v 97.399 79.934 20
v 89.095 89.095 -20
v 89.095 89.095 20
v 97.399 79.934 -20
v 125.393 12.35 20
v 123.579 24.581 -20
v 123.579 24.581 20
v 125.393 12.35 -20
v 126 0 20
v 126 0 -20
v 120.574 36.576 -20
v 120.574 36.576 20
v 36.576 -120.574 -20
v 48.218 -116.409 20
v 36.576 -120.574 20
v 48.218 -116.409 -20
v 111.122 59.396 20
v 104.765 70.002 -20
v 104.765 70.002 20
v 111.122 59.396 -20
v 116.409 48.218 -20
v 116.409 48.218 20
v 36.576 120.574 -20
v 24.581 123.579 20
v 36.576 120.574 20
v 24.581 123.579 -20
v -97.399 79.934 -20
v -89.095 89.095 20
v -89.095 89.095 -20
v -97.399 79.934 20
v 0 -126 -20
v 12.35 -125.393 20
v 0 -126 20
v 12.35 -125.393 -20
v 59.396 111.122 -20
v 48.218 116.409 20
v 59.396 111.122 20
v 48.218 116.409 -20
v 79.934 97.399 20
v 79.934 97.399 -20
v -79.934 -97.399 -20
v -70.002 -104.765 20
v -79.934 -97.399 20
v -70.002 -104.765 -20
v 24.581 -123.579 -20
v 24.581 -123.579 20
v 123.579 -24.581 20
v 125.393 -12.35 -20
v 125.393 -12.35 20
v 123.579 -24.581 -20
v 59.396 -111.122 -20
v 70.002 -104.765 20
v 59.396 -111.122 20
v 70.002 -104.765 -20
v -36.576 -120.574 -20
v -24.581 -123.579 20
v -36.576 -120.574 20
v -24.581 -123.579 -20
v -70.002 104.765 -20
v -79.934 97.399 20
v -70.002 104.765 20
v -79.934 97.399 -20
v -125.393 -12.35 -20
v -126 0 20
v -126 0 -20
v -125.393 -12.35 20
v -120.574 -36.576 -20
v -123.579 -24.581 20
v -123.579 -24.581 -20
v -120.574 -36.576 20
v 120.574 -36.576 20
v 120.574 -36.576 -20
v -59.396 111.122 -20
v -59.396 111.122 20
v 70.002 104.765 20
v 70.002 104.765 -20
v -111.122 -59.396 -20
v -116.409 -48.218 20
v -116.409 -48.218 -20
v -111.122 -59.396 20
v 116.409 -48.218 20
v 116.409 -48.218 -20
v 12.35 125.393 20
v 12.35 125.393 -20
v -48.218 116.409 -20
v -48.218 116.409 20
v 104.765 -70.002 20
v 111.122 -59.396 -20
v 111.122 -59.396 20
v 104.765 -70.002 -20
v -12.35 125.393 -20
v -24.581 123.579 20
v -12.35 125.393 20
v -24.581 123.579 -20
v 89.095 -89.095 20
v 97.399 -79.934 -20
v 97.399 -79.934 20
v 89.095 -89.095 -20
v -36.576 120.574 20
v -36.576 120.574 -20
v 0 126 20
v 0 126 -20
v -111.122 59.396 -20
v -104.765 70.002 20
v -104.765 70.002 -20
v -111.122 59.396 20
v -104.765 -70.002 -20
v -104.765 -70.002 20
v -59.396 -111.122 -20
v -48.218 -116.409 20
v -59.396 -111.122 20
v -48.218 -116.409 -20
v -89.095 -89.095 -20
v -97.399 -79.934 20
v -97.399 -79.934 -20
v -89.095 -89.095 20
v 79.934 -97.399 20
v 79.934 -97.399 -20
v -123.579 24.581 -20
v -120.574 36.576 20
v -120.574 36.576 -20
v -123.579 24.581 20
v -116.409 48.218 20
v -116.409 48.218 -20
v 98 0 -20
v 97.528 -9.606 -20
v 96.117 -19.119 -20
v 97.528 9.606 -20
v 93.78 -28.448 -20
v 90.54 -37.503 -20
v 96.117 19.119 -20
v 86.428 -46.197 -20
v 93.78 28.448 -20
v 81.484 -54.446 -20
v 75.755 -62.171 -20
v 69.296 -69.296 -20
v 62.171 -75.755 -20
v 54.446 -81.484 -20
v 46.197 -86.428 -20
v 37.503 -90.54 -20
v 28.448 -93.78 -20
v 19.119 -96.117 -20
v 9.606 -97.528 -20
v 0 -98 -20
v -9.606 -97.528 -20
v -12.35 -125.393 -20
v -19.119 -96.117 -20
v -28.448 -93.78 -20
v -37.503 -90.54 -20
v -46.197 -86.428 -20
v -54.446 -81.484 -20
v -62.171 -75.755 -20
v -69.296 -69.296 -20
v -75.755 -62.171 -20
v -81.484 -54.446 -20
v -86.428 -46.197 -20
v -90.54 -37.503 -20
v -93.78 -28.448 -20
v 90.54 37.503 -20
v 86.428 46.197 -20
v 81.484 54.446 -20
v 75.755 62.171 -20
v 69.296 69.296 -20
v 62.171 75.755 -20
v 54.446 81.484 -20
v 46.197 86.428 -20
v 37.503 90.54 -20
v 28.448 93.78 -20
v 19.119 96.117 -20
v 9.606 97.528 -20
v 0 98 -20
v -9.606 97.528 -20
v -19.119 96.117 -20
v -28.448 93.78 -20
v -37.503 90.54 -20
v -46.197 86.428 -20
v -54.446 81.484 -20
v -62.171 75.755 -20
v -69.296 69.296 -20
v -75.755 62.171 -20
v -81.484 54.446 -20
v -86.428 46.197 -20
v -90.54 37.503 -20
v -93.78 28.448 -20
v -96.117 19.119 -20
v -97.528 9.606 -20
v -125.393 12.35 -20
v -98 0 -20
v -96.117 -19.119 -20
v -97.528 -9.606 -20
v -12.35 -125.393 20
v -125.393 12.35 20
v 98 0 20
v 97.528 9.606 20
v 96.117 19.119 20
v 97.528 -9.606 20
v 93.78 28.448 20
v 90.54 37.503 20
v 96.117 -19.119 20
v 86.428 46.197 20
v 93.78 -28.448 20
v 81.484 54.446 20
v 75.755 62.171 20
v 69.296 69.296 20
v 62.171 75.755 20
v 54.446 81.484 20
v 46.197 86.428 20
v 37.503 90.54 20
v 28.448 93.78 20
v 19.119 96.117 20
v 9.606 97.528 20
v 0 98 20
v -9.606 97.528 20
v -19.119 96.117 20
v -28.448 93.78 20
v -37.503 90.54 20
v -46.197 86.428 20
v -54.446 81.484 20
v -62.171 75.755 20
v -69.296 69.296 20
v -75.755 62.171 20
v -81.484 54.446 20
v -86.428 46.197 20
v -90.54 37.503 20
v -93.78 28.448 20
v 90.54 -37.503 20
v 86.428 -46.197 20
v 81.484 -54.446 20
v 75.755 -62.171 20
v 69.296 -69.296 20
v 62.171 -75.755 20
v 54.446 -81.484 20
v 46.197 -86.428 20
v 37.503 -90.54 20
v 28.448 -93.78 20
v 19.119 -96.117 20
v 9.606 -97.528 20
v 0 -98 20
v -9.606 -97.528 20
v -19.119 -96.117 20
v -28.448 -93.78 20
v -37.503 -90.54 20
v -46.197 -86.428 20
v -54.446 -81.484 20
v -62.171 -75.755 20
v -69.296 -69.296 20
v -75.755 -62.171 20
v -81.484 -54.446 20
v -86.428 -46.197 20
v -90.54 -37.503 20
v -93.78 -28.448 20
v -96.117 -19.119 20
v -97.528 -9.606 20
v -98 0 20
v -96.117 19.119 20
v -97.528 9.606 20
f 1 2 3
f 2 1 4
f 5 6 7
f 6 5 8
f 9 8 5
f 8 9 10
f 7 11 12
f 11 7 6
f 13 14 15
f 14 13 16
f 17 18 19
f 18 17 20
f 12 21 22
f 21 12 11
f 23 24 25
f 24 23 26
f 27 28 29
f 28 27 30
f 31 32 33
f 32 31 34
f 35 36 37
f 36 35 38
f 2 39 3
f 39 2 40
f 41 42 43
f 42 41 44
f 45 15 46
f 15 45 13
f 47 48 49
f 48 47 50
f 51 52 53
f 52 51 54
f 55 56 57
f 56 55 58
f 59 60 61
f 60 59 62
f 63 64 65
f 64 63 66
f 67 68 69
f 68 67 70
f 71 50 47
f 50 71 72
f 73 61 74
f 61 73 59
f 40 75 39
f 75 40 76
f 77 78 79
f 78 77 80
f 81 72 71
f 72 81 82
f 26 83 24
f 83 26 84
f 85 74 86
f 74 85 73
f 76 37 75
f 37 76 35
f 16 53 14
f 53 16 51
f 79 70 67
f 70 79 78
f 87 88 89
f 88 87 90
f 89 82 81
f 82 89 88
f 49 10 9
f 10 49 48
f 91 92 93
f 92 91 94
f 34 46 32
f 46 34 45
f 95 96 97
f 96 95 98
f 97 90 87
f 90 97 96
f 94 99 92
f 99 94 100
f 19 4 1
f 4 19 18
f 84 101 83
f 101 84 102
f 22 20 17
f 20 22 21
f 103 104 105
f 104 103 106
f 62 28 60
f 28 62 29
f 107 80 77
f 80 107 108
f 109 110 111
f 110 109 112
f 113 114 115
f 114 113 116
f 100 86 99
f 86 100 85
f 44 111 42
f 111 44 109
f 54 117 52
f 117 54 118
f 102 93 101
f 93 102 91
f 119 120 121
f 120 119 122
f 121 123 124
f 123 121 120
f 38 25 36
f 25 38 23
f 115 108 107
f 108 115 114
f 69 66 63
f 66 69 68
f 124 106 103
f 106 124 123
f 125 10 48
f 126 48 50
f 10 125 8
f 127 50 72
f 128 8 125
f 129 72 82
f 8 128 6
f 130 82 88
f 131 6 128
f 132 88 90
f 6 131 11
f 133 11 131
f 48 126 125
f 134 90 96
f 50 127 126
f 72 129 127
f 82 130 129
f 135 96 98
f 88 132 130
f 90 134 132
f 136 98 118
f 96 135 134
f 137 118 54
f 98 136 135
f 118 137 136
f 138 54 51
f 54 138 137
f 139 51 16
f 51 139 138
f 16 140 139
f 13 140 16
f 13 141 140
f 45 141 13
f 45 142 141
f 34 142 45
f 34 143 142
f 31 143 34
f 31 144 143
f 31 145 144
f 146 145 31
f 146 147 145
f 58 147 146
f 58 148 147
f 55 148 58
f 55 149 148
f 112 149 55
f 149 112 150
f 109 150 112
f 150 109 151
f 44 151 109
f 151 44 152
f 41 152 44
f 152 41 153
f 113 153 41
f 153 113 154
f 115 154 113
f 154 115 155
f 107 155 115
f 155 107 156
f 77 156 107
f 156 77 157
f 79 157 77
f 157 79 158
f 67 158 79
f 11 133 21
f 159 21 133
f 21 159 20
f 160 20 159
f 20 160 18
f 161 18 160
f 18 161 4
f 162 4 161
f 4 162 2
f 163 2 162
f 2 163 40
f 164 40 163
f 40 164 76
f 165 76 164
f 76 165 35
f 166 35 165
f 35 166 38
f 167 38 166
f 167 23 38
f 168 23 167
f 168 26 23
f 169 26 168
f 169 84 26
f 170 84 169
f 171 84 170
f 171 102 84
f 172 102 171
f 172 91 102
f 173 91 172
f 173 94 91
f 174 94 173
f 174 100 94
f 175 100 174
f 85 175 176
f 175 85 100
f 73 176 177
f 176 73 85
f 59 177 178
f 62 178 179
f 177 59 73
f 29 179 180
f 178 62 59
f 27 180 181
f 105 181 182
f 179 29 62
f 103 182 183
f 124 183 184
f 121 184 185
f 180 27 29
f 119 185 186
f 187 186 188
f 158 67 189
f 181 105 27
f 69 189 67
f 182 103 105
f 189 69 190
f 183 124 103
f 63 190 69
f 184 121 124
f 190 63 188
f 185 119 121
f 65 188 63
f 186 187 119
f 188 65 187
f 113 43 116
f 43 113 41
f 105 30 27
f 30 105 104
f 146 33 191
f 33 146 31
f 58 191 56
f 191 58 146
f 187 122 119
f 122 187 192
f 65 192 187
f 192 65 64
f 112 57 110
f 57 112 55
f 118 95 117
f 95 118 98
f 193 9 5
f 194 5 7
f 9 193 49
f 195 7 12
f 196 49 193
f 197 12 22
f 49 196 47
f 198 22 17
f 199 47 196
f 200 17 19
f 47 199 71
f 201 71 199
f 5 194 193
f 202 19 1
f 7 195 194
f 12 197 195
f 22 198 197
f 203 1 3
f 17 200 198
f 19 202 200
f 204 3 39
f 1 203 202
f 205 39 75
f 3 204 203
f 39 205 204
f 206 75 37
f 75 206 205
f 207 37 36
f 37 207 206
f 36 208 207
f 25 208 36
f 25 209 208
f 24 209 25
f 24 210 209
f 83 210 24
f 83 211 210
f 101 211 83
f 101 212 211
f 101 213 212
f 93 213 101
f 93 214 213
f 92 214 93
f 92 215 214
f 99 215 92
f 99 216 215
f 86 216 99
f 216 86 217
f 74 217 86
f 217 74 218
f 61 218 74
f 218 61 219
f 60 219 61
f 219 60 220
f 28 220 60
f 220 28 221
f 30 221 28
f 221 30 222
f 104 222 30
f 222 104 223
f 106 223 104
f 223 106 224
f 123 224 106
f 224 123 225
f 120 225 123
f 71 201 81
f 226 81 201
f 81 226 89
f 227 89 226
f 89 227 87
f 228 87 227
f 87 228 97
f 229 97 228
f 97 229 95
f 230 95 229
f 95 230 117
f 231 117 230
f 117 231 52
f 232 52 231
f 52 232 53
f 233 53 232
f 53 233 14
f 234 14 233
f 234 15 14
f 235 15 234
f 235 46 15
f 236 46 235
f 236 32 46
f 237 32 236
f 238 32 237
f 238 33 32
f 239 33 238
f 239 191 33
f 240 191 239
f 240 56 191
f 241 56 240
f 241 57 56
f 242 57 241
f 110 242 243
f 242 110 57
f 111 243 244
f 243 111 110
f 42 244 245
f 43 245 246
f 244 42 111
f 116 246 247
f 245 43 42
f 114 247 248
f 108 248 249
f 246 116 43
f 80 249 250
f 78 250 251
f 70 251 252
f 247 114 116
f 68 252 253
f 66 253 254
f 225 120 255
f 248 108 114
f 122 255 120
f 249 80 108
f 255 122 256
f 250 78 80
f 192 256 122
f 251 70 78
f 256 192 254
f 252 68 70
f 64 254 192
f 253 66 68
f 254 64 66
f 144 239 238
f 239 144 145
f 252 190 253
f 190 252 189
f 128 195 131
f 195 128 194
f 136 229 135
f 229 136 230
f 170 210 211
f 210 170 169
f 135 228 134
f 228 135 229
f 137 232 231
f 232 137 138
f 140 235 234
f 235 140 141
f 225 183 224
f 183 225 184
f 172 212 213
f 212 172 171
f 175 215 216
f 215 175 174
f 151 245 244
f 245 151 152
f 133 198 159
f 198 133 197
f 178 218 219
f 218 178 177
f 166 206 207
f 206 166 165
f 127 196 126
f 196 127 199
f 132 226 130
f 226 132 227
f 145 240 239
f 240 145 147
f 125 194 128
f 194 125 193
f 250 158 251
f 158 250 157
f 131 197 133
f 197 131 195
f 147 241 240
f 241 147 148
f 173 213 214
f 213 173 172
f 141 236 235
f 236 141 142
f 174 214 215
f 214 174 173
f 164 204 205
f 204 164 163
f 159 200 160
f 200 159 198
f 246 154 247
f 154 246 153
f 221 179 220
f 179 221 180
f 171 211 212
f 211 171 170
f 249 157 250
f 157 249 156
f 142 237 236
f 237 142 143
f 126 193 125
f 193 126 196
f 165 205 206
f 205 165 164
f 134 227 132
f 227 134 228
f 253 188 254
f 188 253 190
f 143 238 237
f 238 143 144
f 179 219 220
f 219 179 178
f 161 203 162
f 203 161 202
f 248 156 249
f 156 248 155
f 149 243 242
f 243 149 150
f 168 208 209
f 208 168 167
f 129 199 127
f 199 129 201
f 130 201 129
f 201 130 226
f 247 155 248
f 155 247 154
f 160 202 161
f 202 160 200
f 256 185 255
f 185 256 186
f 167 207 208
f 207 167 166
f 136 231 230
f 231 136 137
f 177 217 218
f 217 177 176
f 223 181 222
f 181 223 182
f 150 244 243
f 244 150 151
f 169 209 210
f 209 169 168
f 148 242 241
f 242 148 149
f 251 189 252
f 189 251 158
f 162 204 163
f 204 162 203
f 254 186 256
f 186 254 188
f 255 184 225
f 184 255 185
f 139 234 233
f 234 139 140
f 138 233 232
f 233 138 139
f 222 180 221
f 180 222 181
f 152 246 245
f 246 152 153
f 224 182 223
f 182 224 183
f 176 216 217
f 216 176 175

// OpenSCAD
// ============================================================================
// Atom Lithography Machine — Parametric OpenSCAD Module (S6.11-03)
// ============================================================================
// part_id           : S6.11-03
// parent_bom_id     : S6.11
// subsystem         : S6
// part_name         : 4 K Ultra-Dusuk-Gurultulu HEMT Bankasi (LNF-LNC4_8C sinifi, 32 adet, 7.8 mW/hat, Exp140 S6.5-03, 1.02 kg)
// material          : OFHC Cu
// temp_stage        : 4 K
// vacuum_grade      : Kriyo-vakum
// tolerance         : T_n<=2.0 K
// computed_mass_kg  : 0.73817
// envelope_mm       : 252.000 x 252.000 x 38.250
// design_maturity   : M0_M1_DETAILED_CAD_DESIGN_ONLY
// no_lab_measurement: true
// iec61508_certified: false
// semi_s2_certified : false
// Units: millimeters (mm)
// ============================================================================

$fn = 64;

// Nominal bounding envelope parameters (mm)
bbox_x = 252.0000;
bbox_y = 252.0000;
bbox_z = 38.2500;

// Part-specific parametric dimensions
n_hemt = 32;
p_4k_w = 0.2496;
tn_k = 2.0;
mass_kg = 1.02;

// Interface / port parameters (mm)
port_hemt32_4k_thermal_od = 252.000;
port_hemt32_4k_thermal_bore = 196.000;
port_hemt32_4k_thermal_pcd = 224.000;
port_hemt32_4k_thermal_bolts = 12;

module part_S6_11_03() {
  union() {
    // 32x 4 K LNF-LNC4_8C HEMT ring
    difference() {
      cylinder(d=252.000, h=40.000, center=true);
      cylinder(d=196.000, h=42.000, center=true);
    }
  }
}

// World assembly mounting transform (global machine frame, mm / deg):
// translate([-650.000, 0.000, 654.000]) rotate([0.000, 0.000, 0.000]) part_S6_11_03();

part_S6_11_03();
